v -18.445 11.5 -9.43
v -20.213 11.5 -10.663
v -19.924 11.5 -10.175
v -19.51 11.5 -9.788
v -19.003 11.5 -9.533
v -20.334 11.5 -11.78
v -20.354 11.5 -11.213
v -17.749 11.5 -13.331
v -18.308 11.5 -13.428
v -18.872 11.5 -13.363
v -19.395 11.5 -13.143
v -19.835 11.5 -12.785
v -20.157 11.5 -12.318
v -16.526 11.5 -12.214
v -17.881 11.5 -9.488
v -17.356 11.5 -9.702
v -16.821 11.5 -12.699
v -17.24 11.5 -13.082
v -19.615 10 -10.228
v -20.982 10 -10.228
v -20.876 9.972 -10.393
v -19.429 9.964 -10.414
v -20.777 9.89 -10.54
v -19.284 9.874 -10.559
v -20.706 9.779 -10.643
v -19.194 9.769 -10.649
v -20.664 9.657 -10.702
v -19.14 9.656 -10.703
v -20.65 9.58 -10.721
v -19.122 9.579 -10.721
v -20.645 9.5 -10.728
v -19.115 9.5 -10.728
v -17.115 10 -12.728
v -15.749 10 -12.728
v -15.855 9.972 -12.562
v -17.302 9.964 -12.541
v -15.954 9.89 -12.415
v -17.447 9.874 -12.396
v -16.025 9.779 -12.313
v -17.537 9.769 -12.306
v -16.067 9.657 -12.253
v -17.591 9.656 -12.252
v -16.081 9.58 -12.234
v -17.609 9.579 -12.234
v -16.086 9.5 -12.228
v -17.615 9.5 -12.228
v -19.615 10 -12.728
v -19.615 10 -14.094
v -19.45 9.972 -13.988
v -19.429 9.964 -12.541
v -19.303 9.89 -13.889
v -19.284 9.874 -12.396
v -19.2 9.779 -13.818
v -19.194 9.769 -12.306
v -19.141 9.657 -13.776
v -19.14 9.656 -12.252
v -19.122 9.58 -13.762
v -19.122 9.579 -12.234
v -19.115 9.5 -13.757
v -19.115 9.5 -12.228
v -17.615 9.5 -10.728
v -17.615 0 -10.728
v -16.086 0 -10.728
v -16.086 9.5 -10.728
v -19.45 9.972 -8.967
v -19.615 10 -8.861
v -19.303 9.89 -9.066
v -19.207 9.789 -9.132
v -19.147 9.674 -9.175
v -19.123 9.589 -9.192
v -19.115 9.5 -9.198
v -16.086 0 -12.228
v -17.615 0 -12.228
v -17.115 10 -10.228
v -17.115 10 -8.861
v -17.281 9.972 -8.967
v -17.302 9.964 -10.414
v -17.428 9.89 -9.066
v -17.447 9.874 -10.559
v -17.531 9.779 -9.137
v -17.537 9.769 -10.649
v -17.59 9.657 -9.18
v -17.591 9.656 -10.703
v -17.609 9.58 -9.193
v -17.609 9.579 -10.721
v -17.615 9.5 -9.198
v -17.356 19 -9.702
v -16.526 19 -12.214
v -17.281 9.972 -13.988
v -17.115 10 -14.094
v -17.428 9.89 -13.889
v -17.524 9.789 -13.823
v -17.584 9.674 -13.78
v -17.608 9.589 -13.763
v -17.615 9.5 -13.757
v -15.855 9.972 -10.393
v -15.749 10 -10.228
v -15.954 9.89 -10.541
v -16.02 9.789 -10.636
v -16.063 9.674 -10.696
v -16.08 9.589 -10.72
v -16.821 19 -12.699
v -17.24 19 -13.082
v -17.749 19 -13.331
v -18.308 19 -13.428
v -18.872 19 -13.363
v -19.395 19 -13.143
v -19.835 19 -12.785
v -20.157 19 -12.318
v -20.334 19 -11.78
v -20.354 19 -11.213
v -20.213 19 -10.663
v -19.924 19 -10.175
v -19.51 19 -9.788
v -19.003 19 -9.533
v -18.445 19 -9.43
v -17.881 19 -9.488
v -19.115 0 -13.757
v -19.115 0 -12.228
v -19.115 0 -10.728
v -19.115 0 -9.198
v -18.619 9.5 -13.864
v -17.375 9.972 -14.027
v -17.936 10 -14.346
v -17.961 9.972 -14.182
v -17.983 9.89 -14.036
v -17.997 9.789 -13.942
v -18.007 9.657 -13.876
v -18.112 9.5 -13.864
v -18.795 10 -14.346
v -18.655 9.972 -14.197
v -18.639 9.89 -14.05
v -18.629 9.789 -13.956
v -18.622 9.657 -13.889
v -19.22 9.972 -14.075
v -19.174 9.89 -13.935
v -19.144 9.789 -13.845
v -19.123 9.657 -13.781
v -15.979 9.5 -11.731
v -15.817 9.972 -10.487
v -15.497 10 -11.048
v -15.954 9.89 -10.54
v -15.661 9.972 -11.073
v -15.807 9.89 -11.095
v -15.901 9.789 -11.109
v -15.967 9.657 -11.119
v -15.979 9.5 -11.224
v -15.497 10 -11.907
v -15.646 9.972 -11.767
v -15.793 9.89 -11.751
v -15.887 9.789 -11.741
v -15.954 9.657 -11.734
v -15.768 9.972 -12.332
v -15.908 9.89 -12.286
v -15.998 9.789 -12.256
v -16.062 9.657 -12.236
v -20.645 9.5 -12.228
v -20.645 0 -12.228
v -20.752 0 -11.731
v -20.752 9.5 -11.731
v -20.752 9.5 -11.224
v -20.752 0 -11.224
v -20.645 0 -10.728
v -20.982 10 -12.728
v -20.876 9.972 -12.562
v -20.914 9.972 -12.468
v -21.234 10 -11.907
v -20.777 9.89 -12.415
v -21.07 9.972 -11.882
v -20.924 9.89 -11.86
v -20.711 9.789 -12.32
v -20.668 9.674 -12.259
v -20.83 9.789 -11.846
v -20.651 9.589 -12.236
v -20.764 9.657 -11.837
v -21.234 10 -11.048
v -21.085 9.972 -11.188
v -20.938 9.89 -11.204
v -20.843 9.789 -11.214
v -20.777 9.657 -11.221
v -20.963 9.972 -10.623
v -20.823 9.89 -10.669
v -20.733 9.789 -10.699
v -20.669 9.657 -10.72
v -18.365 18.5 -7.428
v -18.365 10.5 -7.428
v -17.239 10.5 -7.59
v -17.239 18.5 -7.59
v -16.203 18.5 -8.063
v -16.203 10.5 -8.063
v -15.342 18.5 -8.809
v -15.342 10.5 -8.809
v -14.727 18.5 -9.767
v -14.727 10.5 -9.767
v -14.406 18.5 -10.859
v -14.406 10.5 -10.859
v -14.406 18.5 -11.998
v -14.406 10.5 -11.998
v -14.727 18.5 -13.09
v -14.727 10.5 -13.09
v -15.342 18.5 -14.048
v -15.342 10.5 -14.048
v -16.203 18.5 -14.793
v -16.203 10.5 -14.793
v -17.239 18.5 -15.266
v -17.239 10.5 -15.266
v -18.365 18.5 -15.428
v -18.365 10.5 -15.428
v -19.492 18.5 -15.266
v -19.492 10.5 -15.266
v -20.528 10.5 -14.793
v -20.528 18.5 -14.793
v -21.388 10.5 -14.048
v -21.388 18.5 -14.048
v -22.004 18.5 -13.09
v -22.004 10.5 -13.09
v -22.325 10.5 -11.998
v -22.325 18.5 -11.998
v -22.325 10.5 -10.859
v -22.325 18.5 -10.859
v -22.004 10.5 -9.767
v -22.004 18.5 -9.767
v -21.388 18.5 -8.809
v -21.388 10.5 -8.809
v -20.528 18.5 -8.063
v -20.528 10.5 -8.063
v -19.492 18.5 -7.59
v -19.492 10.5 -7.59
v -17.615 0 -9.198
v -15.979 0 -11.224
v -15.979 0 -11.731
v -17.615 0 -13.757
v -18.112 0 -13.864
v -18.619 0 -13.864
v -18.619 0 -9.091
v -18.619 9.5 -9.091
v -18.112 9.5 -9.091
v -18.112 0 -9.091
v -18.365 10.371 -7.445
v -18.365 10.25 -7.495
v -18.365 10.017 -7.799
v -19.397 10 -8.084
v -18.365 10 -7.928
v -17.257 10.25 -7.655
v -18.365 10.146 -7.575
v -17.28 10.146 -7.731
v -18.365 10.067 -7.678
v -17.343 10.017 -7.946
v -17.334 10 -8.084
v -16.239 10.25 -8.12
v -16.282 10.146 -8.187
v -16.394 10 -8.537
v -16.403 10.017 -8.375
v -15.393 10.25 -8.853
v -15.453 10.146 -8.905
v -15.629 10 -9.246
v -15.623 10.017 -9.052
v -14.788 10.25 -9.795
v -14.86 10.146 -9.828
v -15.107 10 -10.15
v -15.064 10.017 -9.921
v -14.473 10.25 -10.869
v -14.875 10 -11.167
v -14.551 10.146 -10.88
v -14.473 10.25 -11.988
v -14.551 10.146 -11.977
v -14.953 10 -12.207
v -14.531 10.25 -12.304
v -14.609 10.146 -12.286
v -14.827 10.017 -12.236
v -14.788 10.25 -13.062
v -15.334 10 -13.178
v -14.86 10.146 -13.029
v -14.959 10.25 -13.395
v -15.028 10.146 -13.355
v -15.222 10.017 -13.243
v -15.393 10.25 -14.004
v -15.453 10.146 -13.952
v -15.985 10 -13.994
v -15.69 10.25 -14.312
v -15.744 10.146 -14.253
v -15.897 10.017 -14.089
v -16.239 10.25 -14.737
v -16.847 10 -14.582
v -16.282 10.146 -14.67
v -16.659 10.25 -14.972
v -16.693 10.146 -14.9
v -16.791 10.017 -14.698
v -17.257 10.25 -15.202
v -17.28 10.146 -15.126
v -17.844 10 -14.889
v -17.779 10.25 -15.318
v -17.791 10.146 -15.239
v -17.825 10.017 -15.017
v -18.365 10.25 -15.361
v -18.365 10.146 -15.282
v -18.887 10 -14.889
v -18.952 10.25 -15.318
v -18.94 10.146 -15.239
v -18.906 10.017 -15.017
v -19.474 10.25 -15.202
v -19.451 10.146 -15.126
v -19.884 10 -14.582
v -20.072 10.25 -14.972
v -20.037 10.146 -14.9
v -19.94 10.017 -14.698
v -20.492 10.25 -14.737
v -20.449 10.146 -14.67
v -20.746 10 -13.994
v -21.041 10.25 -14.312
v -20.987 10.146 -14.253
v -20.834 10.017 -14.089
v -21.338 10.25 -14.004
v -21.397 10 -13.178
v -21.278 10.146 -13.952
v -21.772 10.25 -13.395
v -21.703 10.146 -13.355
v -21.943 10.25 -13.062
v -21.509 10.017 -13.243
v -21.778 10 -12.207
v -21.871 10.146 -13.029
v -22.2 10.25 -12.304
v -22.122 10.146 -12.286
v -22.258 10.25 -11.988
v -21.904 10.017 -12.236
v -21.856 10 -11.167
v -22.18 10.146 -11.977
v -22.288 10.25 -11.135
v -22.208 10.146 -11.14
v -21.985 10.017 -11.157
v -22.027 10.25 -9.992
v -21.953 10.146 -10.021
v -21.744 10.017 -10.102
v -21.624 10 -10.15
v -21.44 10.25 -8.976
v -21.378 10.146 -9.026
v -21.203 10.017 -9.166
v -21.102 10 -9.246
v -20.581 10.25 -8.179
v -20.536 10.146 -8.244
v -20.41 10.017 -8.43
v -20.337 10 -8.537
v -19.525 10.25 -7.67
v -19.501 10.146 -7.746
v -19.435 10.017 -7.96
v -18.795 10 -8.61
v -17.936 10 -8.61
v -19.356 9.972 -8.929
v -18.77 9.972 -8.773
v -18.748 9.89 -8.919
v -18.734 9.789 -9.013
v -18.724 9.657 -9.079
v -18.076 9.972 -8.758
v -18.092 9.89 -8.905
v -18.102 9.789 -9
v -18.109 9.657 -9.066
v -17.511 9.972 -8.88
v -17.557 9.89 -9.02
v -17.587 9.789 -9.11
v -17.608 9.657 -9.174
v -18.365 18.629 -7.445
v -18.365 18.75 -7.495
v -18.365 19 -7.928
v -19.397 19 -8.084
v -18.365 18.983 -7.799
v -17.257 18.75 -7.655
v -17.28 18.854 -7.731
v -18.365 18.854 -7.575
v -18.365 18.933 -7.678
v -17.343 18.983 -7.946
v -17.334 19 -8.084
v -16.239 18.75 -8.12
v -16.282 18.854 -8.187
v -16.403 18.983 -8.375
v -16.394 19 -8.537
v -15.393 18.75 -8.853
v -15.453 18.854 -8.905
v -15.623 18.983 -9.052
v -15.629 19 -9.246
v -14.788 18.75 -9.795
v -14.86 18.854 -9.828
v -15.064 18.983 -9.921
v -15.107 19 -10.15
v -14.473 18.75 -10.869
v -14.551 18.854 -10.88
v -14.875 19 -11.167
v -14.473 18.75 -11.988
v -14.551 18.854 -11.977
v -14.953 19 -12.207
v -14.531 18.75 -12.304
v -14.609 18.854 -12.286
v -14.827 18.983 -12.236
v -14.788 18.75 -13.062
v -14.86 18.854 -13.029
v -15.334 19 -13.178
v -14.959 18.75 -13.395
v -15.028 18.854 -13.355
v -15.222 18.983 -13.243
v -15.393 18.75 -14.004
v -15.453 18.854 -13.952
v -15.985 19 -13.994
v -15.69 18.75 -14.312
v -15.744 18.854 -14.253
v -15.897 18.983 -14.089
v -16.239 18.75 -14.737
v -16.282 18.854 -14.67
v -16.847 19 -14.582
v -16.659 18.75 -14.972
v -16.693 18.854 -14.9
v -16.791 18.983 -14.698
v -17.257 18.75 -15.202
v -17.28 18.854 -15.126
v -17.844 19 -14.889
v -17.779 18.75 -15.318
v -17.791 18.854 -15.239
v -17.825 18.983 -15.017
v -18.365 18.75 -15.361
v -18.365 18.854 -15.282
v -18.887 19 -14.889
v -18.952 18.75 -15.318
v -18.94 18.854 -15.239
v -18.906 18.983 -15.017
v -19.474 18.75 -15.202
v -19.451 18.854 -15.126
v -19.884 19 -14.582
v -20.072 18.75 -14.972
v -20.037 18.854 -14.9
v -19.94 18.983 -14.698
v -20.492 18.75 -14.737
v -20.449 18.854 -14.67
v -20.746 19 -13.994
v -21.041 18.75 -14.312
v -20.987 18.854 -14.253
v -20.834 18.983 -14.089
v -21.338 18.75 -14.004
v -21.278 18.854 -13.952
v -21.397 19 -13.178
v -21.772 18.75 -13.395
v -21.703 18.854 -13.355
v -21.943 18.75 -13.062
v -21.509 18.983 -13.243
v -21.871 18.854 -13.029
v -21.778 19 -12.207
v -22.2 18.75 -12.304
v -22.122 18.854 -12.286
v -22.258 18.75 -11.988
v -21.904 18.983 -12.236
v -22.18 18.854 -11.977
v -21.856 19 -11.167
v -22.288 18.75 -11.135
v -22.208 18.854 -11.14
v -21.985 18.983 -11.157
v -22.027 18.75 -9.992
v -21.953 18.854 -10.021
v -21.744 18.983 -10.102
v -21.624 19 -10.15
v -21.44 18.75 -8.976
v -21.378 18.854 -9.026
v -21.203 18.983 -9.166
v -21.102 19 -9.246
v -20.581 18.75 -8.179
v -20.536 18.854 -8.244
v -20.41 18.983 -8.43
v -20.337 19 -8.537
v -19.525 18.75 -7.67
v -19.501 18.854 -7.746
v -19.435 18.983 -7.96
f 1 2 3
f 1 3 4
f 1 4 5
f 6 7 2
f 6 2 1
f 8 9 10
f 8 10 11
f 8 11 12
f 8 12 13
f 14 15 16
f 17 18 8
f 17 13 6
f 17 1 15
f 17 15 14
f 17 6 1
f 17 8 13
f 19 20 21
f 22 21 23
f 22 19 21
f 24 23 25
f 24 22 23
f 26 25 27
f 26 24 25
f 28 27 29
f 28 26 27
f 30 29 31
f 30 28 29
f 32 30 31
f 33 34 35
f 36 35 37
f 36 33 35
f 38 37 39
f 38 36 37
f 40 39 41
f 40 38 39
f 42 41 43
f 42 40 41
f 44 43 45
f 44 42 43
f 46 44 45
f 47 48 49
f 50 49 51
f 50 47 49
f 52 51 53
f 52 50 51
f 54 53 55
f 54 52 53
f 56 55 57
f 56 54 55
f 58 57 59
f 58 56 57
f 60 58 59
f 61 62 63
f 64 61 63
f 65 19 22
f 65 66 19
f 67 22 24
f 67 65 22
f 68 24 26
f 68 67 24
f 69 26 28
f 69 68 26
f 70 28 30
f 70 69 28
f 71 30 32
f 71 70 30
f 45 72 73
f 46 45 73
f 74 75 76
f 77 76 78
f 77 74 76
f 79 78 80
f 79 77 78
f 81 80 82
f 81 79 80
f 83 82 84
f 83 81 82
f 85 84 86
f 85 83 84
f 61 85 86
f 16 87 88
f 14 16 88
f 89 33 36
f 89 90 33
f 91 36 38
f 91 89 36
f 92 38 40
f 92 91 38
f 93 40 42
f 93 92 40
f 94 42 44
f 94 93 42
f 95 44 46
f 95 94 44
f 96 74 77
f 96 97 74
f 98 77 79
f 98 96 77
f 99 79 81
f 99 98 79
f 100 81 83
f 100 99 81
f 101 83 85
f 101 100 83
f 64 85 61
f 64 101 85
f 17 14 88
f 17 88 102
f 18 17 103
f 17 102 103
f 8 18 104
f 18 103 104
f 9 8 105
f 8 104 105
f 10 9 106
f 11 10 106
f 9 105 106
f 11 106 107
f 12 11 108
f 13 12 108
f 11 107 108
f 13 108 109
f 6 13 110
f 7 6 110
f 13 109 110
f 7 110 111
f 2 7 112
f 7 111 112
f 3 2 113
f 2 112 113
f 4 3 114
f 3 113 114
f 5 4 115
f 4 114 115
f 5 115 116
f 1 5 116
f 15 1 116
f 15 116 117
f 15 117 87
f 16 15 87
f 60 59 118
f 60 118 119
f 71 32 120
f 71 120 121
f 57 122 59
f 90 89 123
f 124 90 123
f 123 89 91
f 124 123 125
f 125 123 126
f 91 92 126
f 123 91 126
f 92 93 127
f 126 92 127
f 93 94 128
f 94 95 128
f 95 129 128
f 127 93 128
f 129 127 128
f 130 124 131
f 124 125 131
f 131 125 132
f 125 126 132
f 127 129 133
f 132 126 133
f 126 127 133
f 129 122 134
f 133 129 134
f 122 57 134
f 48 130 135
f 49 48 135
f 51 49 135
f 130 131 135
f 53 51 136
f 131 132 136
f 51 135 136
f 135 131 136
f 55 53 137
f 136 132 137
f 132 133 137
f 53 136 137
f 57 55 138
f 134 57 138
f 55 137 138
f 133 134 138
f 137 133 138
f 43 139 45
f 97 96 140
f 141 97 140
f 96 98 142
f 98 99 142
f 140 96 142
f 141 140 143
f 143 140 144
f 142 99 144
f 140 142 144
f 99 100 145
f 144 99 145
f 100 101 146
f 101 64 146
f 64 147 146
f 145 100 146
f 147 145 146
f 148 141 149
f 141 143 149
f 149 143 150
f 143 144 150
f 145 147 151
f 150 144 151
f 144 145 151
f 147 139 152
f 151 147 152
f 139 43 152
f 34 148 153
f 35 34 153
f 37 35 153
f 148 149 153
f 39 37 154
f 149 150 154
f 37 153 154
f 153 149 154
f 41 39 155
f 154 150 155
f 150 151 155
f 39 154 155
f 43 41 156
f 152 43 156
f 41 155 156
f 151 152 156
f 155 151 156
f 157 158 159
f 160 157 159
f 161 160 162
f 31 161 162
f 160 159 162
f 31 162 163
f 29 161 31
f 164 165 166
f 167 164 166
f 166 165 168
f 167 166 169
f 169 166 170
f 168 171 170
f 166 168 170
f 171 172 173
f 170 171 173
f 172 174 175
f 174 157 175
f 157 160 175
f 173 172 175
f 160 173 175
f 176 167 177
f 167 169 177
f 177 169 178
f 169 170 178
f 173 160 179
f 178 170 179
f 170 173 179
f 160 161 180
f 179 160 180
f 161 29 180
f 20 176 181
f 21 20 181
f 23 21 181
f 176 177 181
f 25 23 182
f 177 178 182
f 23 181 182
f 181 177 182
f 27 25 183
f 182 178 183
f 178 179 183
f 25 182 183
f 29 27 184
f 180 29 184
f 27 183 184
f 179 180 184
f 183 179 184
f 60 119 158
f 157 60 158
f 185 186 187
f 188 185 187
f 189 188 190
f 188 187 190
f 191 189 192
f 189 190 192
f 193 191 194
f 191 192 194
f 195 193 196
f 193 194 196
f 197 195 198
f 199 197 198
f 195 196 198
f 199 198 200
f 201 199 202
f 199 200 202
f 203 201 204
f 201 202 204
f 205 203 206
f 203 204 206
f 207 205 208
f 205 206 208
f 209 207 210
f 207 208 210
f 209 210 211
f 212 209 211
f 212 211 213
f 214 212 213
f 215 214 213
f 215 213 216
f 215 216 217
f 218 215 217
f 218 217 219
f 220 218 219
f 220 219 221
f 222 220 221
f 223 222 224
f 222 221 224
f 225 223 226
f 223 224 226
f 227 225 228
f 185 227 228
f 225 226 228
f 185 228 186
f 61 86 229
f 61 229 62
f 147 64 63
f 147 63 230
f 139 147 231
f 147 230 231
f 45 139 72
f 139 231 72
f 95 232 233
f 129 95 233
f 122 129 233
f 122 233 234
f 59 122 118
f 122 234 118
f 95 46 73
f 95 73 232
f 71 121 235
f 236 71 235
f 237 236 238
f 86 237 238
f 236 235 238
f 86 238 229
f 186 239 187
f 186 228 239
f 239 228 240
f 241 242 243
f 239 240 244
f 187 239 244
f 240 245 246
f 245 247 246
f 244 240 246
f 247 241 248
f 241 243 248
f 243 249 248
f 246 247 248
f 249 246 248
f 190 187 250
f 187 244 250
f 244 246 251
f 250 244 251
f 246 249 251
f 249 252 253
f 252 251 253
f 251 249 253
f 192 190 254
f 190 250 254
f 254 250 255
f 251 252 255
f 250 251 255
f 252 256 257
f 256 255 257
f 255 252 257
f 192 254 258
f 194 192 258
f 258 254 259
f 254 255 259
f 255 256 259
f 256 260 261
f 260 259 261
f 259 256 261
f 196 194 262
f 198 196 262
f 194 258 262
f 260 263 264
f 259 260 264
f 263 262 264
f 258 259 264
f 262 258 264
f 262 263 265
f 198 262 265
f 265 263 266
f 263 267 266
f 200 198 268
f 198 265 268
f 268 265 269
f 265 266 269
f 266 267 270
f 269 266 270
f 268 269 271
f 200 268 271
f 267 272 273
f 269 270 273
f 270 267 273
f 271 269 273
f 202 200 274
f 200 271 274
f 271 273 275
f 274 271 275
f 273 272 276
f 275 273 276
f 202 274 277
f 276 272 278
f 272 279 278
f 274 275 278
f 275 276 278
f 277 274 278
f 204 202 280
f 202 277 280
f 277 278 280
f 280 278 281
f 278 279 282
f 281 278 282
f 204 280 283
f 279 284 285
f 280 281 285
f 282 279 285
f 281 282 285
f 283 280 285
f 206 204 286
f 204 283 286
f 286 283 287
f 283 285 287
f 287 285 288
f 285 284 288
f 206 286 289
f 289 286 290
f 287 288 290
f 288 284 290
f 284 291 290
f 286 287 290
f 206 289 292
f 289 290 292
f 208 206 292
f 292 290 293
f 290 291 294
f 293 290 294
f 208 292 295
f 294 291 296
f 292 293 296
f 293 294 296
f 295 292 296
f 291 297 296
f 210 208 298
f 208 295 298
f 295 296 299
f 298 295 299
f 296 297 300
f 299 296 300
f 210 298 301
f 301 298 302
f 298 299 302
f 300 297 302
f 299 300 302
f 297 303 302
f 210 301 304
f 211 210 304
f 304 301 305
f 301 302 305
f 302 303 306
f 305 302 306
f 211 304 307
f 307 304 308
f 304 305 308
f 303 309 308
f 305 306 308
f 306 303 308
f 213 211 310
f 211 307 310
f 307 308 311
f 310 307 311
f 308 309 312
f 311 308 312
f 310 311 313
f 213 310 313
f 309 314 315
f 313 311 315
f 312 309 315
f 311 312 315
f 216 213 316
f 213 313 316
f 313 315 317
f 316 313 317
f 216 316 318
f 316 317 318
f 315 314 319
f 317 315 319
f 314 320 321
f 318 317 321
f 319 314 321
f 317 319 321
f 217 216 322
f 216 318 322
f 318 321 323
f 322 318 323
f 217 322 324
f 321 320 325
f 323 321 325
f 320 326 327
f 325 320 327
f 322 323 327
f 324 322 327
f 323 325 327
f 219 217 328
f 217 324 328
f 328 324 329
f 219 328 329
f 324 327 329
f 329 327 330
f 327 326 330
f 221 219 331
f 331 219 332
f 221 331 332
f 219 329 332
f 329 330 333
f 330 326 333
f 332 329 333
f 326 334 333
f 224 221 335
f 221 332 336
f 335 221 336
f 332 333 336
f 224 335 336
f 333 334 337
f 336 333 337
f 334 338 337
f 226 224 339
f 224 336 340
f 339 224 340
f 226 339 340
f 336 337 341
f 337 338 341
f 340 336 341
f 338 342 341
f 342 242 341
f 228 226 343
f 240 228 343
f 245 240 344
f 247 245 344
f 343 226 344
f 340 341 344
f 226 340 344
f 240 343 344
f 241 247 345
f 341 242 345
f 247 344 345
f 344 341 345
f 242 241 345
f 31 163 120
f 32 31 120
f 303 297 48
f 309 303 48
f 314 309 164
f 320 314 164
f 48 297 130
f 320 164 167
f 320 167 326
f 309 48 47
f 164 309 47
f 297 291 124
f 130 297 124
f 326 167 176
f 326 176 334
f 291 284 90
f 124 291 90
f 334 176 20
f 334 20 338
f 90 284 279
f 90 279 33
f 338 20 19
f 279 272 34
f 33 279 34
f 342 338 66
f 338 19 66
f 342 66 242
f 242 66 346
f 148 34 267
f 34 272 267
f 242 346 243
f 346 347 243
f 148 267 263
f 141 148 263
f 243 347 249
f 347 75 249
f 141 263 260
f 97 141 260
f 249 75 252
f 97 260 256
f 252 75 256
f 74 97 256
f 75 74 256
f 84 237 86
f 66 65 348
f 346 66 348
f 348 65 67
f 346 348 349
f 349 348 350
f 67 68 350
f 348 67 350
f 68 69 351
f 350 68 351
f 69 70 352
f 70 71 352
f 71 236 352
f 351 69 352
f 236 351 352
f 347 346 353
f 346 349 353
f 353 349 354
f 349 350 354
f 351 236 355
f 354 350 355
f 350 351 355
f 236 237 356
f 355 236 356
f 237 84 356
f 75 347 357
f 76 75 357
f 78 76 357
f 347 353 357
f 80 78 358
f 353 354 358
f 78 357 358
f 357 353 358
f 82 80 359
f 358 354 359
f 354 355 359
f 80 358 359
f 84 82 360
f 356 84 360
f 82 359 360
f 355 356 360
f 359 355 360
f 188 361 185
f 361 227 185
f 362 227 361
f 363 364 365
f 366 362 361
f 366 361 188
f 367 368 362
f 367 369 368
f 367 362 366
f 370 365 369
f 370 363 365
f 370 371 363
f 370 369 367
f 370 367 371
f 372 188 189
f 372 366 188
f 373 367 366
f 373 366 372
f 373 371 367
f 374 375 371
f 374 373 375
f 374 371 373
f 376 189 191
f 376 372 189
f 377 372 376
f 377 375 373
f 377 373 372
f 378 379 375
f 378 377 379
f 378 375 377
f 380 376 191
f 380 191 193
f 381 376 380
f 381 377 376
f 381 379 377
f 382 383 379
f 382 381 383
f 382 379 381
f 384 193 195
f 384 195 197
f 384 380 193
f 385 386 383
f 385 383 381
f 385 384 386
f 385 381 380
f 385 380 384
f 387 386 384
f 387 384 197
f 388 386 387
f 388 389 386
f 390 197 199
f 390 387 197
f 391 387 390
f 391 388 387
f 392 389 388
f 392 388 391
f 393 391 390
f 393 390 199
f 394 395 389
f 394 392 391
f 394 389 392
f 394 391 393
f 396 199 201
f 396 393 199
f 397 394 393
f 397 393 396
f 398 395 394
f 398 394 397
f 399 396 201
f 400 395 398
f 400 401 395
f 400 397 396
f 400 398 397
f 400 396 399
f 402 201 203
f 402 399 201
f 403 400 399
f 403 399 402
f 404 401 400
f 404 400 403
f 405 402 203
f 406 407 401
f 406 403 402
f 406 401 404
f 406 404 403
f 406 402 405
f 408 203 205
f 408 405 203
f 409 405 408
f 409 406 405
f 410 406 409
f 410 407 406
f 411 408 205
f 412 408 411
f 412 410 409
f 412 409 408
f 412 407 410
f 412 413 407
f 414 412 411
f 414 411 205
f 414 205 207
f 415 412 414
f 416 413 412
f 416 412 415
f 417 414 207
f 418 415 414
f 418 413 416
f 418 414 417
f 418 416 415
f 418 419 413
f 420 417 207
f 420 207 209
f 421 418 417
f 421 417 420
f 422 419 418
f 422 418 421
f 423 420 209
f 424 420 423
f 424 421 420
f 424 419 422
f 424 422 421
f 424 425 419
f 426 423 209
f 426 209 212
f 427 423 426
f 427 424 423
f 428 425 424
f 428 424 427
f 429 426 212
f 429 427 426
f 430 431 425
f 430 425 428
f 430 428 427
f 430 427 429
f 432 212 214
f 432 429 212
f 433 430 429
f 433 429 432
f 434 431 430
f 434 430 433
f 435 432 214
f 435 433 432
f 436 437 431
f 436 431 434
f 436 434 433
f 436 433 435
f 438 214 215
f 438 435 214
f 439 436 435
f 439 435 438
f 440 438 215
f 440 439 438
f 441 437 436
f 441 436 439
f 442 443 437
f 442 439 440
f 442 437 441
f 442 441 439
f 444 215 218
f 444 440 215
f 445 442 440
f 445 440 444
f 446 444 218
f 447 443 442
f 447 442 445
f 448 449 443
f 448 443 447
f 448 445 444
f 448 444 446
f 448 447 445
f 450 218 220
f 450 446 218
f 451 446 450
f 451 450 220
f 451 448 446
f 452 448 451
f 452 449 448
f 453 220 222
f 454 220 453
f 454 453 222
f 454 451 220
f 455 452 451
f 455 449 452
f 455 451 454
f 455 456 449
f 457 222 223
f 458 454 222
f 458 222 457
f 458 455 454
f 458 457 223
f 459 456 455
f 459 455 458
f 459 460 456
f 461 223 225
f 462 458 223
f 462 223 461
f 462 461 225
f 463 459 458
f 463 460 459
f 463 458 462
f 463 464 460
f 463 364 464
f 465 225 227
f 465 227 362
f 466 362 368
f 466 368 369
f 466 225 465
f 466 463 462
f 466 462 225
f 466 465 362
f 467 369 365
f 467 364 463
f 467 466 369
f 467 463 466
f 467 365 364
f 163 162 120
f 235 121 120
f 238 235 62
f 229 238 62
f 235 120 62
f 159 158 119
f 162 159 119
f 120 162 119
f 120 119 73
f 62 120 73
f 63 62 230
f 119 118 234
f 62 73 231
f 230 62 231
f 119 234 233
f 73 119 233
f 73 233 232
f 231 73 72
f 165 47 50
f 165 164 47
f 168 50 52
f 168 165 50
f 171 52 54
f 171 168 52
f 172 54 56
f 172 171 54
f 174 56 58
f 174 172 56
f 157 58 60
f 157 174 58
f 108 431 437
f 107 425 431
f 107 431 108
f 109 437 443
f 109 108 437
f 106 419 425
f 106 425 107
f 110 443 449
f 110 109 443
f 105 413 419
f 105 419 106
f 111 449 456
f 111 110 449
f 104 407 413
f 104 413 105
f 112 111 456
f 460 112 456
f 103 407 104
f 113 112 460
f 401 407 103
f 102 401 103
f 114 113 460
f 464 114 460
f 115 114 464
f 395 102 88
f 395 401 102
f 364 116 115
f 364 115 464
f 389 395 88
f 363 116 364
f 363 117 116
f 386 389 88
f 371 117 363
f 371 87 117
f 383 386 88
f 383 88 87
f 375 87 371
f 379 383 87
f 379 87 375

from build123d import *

# Parameters (mm, degrees)
RESSALTO_EXTRUS_O1_DEPTH = 10
ESBO_O7_R                = 4
RESSALTO_EXTRUS_O3_DEPTH = 9
CORTE_EXTRUS_O2_DEPTH    = 7.5
FILETE9_R                = 0.5


with BuildPart() as part:
    # Esboço1 → Ressalto-extrusão1 (new body)
    with BuildSketch(Plane(origin=(0, 0, 0), x_dir=(1, 0, 0), z_dir=(0, 1, 0))):
        with BuildLine():
            Line((-16.085684063, 12.227593462), (-17.615486686, 12.227593462))
            Line((-17.615486686, 12.227593462), (-17.615486686, 13.727593462))
            Line((-17.615486686, 13.727593462), (-17.615486686, 13.757396085))
            ThreePointArc((-17.615486686, 13.757396085), (-18.365486686, 13.877593462), (-19.115486686, 13.757396085))
            Line((-19.115486686, 13.757396085), (-19.115486686, 13.727593462))
            Line((-19.115486686, 13.727593462), (-19.115486686, 12.227593462))
            Line((-19.115486686, 12.227593462), (-20.615486686, 12.227593462))
            Line((-20.615486686, 12.227593462), (-20.645289309, 12.227593462))
            ThreePointArc((-20.645289309, 12.227593462), (-20.765486686, 11.477593462), (-20.645289309, 10.727593462))
            Line((-20.645289309, 10.727593462), (-20.615486686, 10.727593462))
            Line((-20.615486686, 10.727593462), (-19.115486686, 10.727593462))
            Line((-19.115486686, 10.727593462), (-19.115486686, 9.227593462))
            Line((-19.115486686, 9.227593462), (-19.115486686, 9.197790839))
            ThreePointArc((-19.115486686, 9.197790839), (-18.365486686, 9.077593462), (-17.615486686, 9.197790839))
            Line((-17.615486686, 9.197790839), (-17.615486686, 9.227593462))
            Line((-17.615486686, 9.227593462), (-17.615486686, 10.727593462))
            Line((-17.615486686, 10.727593462), (-16.085684063, 10.727593462))
            ThreePointArc((-16.085684063, 10.727593462), (-15.965486686, 11.477593462), (-16.085684063, 12.227593462))
        make_face()
    extrude(amount=RESSALTO_EXTRUS_O1_DEPTH)

    # Esboço7 → Ressalto-extrusão3 (add)
    with BuildSketch(Plane(origin=(0, 10, 0), x_dir=(1, 0, 0), z_dir=(0, 1, 0))):
        with Locations(Location((-18.365486686, 11.428442315, 0), (0, 0, 270))):
            Circle(ESBO_O7_R)
    extrude(amount=RESSALTO_EXTRUS_O3_DEPTH)

    # Esboço9 → Corte-extrusão2 (cut)
    with BuildSketch(Plane(origin=(0, 19, 0), x_dir=(1, 0, 0), z_dir=(0, 1, 0))):
        with BuildLine():
            Line((-17.35582754, 9.702004246), (-16.526382122, 12.214377685))
            ThreePointArc((-16.526382122, 12.214377685), (-20.264662492, 12.055444115), (-17.35582754, 9.702004246))
        make_face()
    extrude(amount=-CORTE_EXTRUS_O2_DEPTH, mode=Mode.SUBTRACT)

    # Filete9
    filete9_edges = [part.edges().sort_by_distance(p)[0] for p in [
        (-20.765486686, 10, -11.477593462),
        (-19.880387997, 10, -10.727593462),
        (-19.115486686, 10, -9.96269215),
        (-18.365486686, 10, -9.077593462),
        (-17.615486686, 10, -9.96269215),
        (-16.850585374, 10, -10.727593462),
        (-15.965486686, 10, -11.477593462),
        (-18.365486686, 10, -15.428442315),
        (-18.365486686, 19, -15.428442315),
        (-16.850585374, 10, -12.227593462),
        (-17.615486686, 10, -12.992494773),
        (-19.880387997, 10, -12.227593462),
        (-18.365486686, 10, -13.877593462),
        (-19.115486686, 10, -12.992494773),
    ]]
    fillet(filete9_edges, radius=FILETE9_R)


solid = part.part
